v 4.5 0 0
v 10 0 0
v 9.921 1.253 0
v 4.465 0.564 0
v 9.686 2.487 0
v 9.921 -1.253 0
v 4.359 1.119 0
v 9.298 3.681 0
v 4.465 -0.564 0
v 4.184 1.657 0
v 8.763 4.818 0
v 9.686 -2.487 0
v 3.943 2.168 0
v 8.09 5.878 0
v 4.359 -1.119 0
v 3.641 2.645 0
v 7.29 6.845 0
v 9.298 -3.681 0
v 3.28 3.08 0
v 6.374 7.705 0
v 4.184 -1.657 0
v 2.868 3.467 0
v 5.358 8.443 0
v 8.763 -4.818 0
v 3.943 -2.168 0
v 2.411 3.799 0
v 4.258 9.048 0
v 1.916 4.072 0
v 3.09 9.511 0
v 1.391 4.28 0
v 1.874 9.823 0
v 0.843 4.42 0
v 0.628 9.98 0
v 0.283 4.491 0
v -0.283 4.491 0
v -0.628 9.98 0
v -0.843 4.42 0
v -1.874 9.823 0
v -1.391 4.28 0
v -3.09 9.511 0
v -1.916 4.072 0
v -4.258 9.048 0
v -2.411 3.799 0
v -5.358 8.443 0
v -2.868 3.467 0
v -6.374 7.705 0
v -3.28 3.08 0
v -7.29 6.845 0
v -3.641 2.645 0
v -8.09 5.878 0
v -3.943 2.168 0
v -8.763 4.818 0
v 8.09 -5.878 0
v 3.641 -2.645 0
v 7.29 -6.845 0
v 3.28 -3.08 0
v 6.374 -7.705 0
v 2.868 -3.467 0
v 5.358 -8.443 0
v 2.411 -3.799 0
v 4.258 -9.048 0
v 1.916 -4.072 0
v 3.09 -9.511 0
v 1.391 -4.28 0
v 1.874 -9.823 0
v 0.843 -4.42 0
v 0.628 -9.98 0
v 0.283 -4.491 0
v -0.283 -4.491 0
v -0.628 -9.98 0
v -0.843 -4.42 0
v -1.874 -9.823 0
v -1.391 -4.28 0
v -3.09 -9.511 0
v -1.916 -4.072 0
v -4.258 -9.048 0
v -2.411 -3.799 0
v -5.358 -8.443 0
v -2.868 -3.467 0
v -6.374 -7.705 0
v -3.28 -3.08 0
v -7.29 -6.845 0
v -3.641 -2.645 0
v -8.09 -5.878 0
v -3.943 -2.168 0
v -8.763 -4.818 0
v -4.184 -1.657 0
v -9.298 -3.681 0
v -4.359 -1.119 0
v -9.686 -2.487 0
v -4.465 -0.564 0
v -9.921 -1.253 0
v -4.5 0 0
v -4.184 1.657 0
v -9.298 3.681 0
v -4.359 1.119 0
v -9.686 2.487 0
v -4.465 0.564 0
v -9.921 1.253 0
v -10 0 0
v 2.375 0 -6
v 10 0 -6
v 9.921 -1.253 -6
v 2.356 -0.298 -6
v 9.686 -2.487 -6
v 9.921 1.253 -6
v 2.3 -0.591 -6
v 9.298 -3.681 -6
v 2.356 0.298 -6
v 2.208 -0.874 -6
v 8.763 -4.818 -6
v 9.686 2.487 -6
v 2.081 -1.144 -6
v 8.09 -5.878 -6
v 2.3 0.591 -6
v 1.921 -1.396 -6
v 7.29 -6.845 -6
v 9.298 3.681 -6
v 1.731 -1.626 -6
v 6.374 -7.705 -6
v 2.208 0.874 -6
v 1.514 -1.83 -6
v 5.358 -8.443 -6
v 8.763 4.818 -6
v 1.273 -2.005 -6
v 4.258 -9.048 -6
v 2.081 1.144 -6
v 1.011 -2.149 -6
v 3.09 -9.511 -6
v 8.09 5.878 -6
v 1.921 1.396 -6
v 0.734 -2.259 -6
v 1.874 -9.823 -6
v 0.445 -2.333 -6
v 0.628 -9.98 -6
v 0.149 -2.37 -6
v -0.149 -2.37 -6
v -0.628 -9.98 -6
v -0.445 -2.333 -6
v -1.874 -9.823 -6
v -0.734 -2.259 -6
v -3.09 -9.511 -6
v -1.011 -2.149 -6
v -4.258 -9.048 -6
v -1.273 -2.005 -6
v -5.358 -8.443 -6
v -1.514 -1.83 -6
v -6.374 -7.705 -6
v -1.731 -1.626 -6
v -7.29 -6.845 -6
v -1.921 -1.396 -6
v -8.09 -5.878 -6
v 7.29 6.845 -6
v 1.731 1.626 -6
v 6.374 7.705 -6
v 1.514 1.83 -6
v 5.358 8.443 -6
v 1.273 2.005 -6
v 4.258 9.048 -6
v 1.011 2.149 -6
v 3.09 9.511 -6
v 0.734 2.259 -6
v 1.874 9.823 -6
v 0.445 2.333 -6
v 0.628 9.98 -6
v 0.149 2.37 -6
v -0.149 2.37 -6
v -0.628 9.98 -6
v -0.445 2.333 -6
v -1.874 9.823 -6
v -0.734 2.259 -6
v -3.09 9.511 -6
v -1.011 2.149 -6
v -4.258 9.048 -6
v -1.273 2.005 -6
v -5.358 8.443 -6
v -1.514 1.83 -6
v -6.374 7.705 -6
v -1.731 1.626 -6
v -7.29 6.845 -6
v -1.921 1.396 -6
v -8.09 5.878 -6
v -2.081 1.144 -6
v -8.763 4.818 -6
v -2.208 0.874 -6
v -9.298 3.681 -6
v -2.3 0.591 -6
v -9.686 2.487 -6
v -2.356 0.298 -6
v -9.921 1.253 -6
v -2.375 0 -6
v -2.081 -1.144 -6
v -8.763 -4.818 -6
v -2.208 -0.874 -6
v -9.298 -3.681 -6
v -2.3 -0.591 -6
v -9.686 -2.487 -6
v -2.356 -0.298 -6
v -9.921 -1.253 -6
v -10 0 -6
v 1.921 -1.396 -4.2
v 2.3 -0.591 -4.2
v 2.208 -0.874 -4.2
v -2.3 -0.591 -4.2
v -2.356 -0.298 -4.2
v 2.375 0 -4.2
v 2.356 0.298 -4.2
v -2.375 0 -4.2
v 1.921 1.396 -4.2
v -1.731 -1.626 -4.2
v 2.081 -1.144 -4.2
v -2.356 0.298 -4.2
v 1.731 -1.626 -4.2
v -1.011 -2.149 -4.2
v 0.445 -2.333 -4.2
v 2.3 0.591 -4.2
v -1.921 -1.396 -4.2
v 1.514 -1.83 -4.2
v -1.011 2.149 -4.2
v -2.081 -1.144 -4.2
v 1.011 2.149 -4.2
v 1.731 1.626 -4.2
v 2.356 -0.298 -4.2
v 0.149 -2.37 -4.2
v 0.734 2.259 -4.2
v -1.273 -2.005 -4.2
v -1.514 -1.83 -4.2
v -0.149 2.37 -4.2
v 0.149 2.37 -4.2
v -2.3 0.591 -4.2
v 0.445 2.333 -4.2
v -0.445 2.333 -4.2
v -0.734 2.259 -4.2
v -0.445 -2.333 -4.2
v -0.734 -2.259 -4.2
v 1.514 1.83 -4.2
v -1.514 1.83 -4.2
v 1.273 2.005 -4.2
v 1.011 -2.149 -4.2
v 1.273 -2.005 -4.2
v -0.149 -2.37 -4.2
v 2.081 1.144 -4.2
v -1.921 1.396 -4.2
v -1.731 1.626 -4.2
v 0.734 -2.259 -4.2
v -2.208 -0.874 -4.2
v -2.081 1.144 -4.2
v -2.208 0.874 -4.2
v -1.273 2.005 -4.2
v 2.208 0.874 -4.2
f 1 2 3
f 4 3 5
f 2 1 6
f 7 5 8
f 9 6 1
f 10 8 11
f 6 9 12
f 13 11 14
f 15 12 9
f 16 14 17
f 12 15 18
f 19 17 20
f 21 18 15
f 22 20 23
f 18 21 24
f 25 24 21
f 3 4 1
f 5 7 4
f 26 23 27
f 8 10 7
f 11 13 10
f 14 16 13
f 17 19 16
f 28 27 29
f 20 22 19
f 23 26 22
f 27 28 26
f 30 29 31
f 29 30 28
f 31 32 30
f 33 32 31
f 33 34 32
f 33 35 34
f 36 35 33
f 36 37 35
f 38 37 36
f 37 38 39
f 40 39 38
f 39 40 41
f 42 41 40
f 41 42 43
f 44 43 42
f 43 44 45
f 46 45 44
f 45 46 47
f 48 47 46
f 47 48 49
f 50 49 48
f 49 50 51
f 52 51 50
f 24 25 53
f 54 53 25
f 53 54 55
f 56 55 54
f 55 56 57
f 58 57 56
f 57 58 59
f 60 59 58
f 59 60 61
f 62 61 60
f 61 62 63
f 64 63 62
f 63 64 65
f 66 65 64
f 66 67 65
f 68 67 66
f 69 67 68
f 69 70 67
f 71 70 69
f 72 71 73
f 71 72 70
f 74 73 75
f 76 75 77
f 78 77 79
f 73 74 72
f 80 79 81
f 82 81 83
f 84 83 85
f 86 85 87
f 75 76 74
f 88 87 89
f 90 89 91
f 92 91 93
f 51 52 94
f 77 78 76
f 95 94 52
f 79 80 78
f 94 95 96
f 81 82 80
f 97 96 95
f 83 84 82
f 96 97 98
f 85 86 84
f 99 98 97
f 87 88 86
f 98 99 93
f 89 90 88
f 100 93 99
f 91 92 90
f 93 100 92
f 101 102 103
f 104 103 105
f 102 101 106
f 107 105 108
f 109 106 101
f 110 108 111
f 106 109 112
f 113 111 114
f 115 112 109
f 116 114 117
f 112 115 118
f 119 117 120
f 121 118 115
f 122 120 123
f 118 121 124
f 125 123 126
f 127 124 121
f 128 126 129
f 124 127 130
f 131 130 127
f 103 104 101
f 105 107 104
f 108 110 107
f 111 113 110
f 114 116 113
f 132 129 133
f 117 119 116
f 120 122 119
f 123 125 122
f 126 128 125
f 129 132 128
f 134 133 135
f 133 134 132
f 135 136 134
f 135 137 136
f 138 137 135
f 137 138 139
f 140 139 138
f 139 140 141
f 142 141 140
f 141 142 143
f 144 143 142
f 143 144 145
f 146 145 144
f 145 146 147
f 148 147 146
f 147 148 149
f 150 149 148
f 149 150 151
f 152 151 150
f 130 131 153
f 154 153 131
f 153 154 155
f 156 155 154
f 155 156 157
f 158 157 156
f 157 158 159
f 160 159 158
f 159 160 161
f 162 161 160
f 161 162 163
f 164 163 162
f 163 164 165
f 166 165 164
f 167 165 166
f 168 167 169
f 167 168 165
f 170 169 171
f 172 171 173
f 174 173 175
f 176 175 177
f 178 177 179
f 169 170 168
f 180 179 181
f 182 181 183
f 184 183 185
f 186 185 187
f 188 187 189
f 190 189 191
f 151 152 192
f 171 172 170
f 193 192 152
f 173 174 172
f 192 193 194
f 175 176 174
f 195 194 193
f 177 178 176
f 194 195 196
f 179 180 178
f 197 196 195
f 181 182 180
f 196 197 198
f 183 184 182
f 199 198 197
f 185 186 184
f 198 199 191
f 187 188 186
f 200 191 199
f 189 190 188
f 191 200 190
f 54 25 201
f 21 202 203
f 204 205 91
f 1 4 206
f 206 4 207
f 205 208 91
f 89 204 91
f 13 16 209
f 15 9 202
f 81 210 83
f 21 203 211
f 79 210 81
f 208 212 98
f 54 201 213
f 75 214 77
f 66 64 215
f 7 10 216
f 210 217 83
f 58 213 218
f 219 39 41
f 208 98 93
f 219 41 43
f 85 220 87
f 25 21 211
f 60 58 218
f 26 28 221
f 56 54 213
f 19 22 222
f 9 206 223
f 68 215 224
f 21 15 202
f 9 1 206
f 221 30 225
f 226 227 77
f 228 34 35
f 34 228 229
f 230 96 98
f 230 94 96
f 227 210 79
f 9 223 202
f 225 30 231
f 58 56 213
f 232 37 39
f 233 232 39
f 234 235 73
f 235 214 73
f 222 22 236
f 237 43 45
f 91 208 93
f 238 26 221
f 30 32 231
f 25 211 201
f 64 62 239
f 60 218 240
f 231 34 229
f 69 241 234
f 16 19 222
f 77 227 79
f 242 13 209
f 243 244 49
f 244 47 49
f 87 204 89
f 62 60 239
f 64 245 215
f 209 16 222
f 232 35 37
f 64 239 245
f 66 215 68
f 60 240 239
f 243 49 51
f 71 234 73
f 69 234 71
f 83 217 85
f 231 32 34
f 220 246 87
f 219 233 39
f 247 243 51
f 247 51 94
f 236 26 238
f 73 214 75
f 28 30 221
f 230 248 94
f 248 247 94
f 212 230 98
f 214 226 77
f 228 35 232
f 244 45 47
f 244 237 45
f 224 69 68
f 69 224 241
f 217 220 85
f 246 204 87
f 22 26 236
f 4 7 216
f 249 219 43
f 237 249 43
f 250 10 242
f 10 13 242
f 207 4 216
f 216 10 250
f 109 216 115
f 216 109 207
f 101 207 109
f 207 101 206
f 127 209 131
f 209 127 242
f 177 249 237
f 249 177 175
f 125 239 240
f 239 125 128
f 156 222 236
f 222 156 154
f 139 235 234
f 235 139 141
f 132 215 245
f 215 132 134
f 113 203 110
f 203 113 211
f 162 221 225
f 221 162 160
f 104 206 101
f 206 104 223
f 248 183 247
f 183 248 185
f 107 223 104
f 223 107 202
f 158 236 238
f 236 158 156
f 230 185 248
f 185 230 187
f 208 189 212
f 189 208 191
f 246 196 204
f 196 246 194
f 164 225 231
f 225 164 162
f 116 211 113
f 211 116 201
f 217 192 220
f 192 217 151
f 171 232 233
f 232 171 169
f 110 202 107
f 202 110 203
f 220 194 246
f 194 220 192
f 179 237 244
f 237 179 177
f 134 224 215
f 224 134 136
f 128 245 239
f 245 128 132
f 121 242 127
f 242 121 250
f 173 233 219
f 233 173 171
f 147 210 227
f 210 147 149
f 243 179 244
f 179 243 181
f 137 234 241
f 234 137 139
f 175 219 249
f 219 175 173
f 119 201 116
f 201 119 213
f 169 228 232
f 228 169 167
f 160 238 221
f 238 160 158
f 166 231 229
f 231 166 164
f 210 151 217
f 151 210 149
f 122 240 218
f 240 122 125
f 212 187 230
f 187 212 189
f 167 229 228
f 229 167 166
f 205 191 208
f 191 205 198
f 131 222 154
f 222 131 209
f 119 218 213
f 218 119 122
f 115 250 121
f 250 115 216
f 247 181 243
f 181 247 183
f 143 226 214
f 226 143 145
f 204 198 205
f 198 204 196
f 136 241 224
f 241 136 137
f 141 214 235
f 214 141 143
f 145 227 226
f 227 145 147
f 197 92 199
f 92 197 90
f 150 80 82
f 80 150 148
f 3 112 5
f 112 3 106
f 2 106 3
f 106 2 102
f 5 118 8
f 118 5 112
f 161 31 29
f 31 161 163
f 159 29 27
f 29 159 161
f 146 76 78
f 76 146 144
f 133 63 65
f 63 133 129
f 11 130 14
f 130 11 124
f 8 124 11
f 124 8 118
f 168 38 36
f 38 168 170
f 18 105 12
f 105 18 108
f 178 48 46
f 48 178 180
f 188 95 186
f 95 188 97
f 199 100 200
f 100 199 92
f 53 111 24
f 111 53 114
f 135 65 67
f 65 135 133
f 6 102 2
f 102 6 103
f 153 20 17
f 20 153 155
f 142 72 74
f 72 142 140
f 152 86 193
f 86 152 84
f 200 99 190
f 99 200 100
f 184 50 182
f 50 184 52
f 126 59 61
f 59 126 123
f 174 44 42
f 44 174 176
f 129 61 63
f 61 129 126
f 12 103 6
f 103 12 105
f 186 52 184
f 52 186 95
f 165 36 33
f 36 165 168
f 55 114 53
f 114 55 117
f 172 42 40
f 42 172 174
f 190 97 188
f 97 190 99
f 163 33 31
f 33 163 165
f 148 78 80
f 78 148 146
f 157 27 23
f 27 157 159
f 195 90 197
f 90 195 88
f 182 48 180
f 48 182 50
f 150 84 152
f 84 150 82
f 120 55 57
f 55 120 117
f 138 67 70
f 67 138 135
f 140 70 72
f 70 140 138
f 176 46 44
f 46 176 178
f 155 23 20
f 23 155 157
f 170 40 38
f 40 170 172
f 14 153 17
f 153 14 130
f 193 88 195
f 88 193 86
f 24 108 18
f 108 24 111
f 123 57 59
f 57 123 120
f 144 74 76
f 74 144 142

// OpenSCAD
$fn = 50;


difference() {
	union() {
		translate(v = [0, 0, -6.0000000000]) {
			cylinder(h = 6, r = 10.0000000000);
		}
		cylinder(h = 0, r = 19.0000000000);
	}
	union() {
		translate(v = [0, 0, 0]) {
			rotate(a = [0, 0, 0]) {
				difference() {
					union() {
						#translate(v = [0, 0, -6.0000000000]) {
							cylinder(h = 6, r = 2.2500000000);
						}
						#translate(v = [0, 0, -4.2000000000]) {
							cylinder(h = 4.2000000000, r = 10.0000000000, r1 = 2.3750000000, r2 = 4.5000000000);
						}
						#translate(v = [0, 0, -6.0000000000]) {
							cylinder(h = 6, r = 2.3750000000);
						}
						#translate(v = [0, 0, -6.0000000000]) {
							cylinder(h = 6, r = 2.2500000000);
						}
					}
					union();
				}
			}
		}
	}
}
